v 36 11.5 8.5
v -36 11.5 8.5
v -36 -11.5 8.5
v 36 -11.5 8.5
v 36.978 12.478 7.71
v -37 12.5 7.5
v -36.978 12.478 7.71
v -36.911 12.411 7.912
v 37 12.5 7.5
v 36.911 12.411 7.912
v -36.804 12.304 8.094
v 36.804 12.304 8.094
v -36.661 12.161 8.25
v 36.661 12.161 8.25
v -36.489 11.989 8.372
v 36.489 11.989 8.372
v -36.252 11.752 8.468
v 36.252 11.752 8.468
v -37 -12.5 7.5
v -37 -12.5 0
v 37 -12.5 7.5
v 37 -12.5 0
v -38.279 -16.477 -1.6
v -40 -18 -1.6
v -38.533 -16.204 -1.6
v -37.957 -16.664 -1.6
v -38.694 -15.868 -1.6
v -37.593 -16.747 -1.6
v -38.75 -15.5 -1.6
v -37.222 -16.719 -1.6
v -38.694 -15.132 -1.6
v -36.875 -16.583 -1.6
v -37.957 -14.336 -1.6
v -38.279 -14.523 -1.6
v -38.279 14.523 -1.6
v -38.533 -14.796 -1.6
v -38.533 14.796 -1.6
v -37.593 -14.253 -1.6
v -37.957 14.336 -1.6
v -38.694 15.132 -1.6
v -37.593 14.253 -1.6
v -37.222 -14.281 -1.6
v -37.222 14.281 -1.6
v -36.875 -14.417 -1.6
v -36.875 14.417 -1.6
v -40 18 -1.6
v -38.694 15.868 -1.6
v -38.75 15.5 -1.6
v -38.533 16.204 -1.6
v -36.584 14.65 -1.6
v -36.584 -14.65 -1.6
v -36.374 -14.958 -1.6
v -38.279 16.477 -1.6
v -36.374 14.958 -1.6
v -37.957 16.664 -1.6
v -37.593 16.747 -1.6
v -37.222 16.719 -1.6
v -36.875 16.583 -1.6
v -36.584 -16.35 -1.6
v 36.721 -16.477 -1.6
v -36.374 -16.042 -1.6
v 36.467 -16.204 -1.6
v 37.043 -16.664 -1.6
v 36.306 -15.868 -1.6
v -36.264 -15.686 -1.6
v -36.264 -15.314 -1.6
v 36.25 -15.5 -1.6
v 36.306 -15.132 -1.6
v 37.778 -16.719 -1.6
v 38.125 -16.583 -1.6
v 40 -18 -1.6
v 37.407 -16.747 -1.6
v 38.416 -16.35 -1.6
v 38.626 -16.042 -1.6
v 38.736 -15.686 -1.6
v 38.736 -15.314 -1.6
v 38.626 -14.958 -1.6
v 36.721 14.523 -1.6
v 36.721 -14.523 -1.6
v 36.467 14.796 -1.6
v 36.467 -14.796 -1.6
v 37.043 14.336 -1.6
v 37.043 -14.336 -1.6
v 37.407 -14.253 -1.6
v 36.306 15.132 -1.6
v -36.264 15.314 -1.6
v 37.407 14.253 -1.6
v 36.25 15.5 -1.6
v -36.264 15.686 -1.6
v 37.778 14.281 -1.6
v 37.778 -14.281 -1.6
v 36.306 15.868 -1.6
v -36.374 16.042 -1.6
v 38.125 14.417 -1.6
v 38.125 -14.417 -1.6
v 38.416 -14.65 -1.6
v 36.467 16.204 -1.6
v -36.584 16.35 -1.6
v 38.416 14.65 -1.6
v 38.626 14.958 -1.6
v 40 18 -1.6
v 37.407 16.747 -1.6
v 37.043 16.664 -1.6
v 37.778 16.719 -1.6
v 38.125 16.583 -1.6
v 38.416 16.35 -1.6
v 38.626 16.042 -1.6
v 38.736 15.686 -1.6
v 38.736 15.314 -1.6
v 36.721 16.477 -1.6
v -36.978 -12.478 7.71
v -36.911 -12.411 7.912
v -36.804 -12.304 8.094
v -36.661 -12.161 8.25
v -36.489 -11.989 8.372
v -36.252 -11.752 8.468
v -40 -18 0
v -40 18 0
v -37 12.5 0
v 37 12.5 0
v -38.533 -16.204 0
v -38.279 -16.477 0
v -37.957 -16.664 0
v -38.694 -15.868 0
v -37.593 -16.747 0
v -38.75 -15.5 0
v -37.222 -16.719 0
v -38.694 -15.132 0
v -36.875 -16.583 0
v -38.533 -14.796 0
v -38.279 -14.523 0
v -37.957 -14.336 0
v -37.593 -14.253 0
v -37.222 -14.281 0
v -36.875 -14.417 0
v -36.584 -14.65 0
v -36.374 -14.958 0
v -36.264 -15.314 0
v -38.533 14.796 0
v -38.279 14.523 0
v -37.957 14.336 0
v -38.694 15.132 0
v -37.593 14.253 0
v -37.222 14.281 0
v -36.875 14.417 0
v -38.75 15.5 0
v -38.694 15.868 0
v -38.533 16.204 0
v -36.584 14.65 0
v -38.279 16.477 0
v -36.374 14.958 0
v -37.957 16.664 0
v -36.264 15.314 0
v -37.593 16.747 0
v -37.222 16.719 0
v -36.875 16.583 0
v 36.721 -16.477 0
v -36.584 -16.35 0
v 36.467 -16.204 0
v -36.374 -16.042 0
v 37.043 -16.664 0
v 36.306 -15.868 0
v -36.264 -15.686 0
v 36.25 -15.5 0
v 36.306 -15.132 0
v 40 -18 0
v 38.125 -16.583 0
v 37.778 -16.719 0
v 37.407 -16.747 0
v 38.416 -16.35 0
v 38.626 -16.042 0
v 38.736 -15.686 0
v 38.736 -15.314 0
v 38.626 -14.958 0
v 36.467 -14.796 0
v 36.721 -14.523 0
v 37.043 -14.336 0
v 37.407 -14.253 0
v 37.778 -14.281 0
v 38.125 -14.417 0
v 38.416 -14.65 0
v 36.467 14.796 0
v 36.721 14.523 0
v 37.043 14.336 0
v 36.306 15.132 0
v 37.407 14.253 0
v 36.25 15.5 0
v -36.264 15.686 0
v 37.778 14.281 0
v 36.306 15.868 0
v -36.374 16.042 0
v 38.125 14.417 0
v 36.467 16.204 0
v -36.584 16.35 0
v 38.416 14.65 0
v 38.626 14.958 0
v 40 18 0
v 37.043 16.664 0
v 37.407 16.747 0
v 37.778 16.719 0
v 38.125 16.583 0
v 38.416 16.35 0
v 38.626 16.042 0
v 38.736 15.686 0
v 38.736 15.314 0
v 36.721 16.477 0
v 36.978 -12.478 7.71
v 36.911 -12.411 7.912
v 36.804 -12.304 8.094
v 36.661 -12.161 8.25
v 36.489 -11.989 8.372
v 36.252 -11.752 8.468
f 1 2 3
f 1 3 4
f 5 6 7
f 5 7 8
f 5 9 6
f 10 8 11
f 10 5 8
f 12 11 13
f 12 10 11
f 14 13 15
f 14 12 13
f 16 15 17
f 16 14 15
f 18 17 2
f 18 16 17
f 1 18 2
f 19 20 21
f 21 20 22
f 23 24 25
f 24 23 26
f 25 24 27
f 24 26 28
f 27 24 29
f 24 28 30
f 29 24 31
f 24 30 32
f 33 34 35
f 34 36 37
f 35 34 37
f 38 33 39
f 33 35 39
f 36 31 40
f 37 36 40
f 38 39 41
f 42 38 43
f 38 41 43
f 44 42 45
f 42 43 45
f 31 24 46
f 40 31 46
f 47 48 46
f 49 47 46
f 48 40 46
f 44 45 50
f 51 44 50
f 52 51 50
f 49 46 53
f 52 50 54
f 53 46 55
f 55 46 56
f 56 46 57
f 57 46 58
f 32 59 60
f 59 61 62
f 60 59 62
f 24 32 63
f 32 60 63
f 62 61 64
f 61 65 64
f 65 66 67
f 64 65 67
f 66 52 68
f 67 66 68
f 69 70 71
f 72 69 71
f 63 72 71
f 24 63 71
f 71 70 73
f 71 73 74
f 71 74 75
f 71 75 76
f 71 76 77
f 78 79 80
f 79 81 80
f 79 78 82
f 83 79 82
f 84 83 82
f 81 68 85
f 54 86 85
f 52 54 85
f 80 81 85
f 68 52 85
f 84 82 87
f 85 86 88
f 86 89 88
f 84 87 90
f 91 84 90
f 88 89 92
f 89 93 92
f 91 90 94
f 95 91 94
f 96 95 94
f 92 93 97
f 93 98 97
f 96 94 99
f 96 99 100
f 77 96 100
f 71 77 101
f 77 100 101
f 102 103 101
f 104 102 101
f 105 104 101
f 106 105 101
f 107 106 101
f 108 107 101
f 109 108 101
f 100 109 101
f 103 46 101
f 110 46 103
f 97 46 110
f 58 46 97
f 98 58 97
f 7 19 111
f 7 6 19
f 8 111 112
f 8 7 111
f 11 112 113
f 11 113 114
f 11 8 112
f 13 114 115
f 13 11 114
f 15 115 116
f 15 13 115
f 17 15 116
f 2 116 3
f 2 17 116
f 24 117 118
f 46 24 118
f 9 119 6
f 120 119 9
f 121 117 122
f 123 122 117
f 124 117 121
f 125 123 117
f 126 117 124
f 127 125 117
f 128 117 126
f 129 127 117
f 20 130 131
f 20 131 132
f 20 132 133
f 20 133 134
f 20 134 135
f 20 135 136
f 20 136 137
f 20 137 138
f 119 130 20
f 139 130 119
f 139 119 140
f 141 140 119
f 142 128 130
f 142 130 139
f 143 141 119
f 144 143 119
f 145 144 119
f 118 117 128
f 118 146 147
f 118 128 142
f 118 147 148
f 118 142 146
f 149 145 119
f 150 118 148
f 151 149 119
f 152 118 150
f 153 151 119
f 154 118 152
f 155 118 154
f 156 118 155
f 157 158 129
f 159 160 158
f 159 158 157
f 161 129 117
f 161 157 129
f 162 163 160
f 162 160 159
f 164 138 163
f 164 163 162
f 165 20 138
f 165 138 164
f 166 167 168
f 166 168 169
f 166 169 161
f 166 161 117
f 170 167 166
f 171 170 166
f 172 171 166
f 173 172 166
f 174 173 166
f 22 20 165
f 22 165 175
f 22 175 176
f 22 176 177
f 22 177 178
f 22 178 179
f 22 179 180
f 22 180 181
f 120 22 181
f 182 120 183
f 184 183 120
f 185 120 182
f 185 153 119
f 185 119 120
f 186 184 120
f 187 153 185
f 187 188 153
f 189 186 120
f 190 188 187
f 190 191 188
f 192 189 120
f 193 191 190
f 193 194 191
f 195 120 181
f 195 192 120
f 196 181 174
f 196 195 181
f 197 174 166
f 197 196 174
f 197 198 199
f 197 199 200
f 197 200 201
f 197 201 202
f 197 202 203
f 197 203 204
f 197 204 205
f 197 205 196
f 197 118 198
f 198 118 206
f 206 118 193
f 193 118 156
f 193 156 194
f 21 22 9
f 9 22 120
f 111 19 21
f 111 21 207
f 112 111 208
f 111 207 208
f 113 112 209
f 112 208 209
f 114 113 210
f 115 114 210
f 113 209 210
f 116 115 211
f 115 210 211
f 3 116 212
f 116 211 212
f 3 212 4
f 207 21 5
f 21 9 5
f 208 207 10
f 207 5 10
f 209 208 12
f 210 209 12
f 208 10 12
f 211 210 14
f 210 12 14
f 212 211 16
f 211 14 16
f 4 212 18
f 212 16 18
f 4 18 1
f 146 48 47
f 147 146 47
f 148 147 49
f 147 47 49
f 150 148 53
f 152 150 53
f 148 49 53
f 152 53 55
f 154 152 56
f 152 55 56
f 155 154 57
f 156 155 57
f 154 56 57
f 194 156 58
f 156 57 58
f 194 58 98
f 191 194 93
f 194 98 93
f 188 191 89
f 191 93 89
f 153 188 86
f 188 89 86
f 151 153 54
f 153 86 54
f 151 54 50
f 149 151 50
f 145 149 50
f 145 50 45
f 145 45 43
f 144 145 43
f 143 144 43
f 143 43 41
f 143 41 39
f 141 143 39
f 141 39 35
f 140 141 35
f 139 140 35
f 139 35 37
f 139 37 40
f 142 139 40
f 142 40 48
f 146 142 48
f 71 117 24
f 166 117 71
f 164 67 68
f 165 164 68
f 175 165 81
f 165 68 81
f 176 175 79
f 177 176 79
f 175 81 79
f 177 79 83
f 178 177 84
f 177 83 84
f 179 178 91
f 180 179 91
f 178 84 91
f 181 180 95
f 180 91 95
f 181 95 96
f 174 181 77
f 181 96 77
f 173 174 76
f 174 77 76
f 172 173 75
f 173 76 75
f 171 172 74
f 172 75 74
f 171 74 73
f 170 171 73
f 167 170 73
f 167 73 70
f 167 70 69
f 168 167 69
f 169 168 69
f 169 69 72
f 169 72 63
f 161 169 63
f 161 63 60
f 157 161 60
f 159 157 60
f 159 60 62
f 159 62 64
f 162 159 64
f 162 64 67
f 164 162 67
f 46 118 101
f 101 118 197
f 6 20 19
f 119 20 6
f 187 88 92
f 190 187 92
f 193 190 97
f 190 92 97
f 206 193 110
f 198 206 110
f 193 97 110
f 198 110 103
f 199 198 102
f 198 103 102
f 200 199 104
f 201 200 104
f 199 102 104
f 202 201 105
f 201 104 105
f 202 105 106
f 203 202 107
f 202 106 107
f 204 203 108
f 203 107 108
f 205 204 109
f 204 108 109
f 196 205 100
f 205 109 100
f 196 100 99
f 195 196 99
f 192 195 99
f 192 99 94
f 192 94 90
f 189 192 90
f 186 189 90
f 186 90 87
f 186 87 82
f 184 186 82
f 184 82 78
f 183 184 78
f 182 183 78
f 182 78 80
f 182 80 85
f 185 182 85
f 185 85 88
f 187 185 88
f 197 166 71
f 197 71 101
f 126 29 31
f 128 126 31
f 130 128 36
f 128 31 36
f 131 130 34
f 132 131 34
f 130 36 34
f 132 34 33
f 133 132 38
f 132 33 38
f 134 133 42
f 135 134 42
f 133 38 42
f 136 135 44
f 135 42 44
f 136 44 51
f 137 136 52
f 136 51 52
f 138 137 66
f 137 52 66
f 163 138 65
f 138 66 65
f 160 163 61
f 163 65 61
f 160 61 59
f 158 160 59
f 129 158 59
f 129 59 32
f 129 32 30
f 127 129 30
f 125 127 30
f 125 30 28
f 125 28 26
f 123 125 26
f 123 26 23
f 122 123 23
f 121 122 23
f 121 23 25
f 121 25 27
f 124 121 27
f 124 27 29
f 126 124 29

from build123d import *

# Parameters (mm, degrees)
F0_W     = 80
F0_H     = 36
F0_W_2   = 74
F0_H_2   = 25
F1_DEPTH = 1.6
F2_DEPTH = 8.5
F3_D     = 2.5
F4_R     = 1


with BuildPart() as f1:
    # F0 (on Top) → F1 (new body)
    with BuildSketch(Plane.XY):
        Rectangle(F0_W, F0_H)
        Rectangle(F0_W_2, F0_H_2, mode=Mode.SUBTRACT)
        Rectangle(F0_W_2, F0_H_2)
    extrude(amount=-F1_DEPTH)

    # F0 (on Top) → F2 (join)
    with BuildSketch(Plane.XY):
        Rectangle(F0_W_2, F0_H_2)
    extrude(amount=F2_DEPTH)

    # F3 (through all)
    with Locations(Plane.XY):
        with Locations((-37.5, 15.5), (37.5, 15.5), (37.5, -15.5), (-37.5, -15.5)):
            Hole(F3_D / 2)

    # F4
    f4_edges = [f1.edges().sort_by_distance(p)[0] for p in [
        (0, 12.5, 8.5),
        (-37, 0, 8.5),
        (0, -12.5, 8.5),
        (37, 0, 8.5),
    ]]
    fillet(f4_edges, radius=F4_R)


solid = f1.part
